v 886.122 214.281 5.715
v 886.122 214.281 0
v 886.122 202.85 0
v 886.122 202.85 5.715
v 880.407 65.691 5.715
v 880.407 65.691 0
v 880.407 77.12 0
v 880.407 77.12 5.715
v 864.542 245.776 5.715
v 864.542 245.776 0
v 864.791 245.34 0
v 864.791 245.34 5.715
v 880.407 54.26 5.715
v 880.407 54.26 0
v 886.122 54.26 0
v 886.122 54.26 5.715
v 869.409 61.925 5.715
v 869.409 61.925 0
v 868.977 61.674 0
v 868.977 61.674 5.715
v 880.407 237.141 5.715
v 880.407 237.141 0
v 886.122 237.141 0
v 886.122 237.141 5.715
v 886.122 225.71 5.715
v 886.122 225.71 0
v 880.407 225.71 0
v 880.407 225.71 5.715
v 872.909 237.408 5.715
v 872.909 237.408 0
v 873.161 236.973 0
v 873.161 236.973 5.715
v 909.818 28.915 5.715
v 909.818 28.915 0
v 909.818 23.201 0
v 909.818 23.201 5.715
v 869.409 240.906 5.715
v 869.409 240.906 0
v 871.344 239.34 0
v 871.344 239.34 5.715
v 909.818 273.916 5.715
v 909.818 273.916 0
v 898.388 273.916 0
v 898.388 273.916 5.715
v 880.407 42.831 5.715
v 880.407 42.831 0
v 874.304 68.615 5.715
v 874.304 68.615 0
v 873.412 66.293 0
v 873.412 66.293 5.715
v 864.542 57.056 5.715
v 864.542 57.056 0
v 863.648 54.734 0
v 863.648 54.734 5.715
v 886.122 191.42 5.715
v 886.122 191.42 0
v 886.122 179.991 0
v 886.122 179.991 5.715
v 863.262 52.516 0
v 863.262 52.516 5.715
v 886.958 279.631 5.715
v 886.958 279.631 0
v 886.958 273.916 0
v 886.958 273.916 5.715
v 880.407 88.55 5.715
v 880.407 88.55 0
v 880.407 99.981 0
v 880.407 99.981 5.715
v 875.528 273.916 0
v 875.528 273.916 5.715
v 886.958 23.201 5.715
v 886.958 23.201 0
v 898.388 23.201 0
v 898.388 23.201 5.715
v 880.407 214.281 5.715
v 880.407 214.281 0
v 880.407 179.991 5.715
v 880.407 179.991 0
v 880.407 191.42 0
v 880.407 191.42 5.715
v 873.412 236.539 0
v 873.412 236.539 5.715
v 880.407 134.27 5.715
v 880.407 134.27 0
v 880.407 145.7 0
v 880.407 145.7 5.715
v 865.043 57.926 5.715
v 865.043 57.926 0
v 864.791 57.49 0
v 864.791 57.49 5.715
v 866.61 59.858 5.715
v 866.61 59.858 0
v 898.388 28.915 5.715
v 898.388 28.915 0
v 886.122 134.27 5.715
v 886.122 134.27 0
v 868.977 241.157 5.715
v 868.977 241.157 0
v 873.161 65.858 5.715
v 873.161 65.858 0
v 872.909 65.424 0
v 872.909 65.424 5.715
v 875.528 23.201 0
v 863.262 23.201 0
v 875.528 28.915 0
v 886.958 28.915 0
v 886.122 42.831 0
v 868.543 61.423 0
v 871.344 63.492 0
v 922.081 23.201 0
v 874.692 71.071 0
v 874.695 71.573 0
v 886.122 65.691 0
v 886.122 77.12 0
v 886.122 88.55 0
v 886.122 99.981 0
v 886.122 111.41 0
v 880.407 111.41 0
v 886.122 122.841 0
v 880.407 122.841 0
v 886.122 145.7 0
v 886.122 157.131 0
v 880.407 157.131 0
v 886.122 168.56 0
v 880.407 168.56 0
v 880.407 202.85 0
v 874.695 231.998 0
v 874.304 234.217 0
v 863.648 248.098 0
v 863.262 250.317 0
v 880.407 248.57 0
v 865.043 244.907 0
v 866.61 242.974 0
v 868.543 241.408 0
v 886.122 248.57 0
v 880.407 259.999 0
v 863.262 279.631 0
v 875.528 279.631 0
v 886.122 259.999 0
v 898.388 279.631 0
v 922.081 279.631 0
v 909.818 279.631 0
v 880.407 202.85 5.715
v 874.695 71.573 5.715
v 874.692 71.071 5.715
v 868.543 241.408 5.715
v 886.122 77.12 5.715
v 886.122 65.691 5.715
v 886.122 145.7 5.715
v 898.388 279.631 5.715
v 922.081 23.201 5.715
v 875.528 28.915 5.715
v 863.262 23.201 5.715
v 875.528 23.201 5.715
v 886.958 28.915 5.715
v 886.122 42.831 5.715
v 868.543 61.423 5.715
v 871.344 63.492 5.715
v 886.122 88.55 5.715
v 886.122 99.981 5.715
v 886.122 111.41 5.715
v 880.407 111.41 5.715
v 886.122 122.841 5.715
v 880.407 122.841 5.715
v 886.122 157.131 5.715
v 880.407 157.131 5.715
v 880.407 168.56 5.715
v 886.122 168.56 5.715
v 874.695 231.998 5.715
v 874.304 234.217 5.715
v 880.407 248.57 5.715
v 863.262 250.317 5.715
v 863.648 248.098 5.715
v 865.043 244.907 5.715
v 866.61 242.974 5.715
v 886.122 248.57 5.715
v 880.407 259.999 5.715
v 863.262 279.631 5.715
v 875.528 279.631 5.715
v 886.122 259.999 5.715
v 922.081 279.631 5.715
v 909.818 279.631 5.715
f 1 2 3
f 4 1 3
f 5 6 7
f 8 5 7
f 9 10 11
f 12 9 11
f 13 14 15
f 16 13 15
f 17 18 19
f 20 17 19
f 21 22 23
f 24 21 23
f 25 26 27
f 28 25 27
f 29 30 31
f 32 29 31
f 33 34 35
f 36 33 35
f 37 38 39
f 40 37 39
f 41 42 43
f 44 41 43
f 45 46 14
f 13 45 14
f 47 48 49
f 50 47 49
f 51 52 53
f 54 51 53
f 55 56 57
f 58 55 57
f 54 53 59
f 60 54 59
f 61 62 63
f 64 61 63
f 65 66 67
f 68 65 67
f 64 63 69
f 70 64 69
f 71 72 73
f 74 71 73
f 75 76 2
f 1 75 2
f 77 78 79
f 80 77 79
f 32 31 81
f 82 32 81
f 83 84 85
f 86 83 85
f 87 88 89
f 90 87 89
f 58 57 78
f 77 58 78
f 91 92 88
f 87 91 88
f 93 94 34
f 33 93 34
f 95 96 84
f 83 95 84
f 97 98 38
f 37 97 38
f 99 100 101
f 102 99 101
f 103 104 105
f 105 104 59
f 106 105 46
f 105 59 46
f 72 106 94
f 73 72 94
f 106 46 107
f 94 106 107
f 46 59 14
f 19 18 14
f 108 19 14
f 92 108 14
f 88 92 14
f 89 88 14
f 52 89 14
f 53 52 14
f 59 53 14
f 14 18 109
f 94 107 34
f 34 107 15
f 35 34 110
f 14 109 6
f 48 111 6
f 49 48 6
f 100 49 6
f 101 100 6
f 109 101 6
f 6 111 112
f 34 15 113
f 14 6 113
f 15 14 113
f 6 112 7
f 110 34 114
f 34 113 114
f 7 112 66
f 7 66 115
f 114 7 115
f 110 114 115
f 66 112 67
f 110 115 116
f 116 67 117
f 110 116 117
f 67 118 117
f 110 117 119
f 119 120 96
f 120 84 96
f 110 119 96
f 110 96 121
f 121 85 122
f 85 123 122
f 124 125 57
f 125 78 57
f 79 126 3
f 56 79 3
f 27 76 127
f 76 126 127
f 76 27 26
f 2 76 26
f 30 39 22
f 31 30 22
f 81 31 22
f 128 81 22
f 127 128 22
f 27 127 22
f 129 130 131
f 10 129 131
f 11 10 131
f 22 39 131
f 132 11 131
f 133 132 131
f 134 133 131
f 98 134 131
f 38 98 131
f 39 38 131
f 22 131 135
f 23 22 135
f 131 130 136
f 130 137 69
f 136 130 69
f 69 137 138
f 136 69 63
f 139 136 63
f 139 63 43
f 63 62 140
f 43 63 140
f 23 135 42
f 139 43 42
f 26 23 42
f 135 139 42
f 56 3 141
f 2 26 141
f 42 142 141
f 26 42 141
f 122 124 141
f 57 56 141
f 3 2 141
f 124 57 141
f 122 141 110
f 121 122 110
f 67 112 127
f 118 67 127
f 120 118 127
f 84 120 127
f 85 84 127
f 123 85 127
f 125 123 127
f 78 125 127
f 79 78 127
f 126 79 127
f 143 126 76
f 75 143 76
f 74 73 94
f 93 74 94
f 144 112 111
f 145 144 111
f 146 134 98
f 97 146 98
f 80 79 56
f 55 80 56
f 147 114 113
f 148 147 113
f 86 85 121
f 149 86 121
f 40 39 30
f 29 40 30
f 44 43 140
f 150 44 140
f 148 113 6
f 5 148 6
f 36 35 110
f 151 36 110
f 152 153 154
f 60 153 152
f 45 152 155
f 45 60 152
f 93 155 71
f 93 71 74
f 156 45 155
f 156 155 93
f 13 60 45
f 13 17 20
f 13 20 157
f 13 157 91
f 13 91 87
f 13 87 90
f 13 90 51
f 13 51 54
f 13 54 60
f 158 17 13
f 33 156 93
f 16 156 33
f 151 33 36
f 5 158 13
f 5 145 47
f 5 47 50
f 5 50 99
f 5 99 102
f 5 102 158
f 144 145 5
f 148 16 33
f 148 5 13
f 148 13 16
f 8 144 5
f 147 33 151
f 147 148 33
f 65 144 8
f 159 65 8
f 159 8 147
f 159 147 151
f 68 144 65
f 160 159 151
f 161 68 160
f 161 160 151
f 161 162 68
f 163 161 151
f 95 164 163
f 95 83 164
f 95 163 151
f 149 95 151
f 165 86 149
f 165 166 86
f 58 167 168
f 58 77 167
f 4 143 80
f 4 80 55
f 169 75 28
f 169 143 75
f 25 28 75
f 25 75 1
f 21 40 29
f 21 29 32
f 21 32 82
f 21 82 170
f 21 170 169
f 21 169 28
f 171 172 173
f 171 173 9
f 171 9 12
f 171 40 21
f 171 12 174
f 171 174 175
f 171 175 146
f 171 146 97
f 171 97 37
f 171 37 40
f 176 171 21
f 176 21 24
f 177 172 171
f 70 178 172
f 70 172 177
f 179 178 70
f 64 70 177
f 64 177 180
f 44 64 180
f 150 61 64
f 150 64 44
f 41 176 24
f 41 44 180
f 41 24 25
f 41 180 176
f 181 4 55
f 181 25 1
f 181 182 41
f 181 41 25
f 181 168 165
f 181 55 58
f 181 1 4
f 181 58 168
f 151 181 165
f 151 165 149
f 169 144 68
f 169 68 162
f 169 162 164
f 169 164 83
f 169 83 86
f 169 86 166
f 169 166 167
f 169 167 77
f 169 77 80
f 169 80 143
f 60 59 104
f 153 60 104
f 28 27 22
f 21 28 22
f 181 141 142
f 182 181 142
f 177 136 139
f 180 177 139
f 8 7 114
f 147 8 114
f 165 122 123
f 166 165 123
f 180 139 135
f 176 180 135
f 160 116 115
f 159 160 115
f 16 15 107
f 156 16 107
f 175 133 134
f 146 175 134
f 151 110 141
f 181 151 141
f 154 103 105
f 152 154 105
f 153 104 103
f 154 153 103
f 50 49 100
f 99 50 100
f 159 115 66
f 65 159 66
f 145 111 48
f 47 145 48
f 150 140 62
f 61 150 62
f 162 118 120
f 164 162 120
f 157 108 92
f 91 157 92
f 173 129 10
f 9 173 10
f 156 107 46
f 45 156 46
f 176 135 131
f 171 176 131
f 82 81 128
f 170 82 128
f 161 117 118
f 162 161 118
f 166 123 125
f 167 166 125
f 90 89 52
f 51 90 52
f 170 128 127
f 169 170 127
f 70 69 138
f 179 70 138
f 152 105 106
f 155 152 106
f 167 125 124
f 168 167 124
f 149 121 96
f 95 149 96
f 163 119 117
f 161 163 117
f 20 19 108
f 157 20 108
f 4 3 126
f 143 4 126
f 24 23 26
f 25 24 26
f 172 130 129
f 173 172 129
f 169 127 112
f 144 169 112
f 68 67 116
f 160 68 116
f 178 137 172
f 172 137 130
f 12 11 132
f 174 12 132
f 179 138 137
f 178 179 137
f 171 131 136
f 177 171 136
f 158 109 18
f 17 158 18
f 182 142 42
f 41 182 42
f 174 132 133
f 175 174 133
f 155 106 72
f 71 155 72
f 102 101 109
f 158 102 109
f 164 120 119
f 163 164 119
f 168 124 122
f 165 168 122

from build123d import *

# Parameters (mm, degrees)
BOSS_EXTRUDE1_DEPTH = 5.715


with BuildPart() as part:
    # Model → Boss-Extrude1 (new body)
    with BuildSketch(Plane.XY):
        Polygon((863.26218, 23.2006394), (875.52784, 23.2006394), (875.52784, 28.91536), (886.95784, 28.91536), (886.95784, 23.2006394), (898.38784, 23.2006394), (898.38784, 28.91536), (909.81784, 28.91536), (909.81784, 23.2006394), (922.08096, 23.2006394), (922.08096, 279.63114), (909.81784, 279.63114), (909.81784, 273.91614), (898.38784, 273.91614), (898.38784, 279.63114), (886.95784, 279.63114), (886.95784, 273.91614), (875.52784, 273.91614), (875.52784, 279.63114), (863.26218, 279.63114), (863.26218, 251.055124), (863.26218, 250.316746), (863.64826, 248.098056), (864.54234, 245.775988), (864.79126, 245.340378), (865.04272, 244.906546), (866.6099, 242.974368), (868.54284, 241.407696), (868.97718, 241.156744), (869.40898, 240.906046), (871.34446, 239.34039), (872.9091, 237.408466), (873.16056, 236.972856), (873.41202, 236.539024), (874.30356, 234.216956), (874.69472, 231.998266), (874.69472, 231.25811), (874.69472, 71.572628), (874.69218, 71.070978), (874.30356, 68.615306), (873.41202, 66.293238), (873.16056, 65.857882), (872.9091, 65.423796), (871.34446, 63.491872), (869.40898, 61.924946), (868.97718, 61.673994), (868.54284, 61.423296), (866.6099, 59.857894), (865.04272, 57.925716), (864.79126, 57.49036), (864.54234, 57.056274), (863.64826, 54.734206), (863.26218, 52.515516), (863.26218, 51.775868), align=None)
        Polygon((880.40718, 254.28448), (880.40718, 259.99948), (886.12218, 259.99948), (886.12218, 248.570496), (880.40718, 248.570496), align=None, mode=Mode.SUBTRACT)
        Polygon((880.40718, 231.424988), (880.40718, 237.141004), (886.12218, 237.141004), (886.12218, 225.710496), (880.40718, 225.710496), align=None, mode=Mode.SUBTRACT)
        Polygon((880.40718, 208.566004), (880.40718, 214.28075), (886.12218, 214.28075), (886.12218, 202.849988), (880.40718, 202.849988), align=None, mode=Mode.SUBTRACT)
        Polygon((880.40718, 185.70575), (880.40718, 191.420496), (886.12218, 191.420496), (886.12218, 179.991004), (880.40718, 179.991004), align=None, mode=Mode.SUBTRACT)
        Polygon((880.40718, 162.845496), (880.40718, 168.560496), (886.12218, 168.560496), (886.12218, 157.13075), (880.40718, 157.13075), align=None, mode=Mode.SUBTRACT)
        Polygon((880.40718, 139.985496), (880.40718, 145.699988), (886.12218, 145.699988), (886.12218, 134.270496), (880.40718, 134.270496), align=None, mode=Mode.SUBTRACT)
        Polygon((880.40718, 117.124988), (880.40718, 122.841004), (886.12218, 122.841004), (886.12218, 111.410496), (880.40718, 111.410496), align=None, mode=Mode.SUBTRACT)
        Polygon((880.40718, 94.266004), (880.40718, 99.98075), (886.12218, 99.98075), (886.12218, 88.549988), (880.40718, 88.549988), align=None, mode=Mode.SUBTRACT)
        Polygon((880.40718, 71.40575), (880.40718, 77.120496), (886.12218, 77.120496), (886.12218, 65.691004), (880.40718, 65.691004), align=None, mode=Mode.SUBTRACT)
        Polygon((880.40718, 48.545496), (880.40718, 54.260496), (886.12218, 54.260496), (886.12218, 42.83075), (880.40718, 42.83075), align=None, mode=Mode.SUBTRACT)
    extrude(amount=BOSS_EXTRUDE1_DEPTH)


solid = part.part
